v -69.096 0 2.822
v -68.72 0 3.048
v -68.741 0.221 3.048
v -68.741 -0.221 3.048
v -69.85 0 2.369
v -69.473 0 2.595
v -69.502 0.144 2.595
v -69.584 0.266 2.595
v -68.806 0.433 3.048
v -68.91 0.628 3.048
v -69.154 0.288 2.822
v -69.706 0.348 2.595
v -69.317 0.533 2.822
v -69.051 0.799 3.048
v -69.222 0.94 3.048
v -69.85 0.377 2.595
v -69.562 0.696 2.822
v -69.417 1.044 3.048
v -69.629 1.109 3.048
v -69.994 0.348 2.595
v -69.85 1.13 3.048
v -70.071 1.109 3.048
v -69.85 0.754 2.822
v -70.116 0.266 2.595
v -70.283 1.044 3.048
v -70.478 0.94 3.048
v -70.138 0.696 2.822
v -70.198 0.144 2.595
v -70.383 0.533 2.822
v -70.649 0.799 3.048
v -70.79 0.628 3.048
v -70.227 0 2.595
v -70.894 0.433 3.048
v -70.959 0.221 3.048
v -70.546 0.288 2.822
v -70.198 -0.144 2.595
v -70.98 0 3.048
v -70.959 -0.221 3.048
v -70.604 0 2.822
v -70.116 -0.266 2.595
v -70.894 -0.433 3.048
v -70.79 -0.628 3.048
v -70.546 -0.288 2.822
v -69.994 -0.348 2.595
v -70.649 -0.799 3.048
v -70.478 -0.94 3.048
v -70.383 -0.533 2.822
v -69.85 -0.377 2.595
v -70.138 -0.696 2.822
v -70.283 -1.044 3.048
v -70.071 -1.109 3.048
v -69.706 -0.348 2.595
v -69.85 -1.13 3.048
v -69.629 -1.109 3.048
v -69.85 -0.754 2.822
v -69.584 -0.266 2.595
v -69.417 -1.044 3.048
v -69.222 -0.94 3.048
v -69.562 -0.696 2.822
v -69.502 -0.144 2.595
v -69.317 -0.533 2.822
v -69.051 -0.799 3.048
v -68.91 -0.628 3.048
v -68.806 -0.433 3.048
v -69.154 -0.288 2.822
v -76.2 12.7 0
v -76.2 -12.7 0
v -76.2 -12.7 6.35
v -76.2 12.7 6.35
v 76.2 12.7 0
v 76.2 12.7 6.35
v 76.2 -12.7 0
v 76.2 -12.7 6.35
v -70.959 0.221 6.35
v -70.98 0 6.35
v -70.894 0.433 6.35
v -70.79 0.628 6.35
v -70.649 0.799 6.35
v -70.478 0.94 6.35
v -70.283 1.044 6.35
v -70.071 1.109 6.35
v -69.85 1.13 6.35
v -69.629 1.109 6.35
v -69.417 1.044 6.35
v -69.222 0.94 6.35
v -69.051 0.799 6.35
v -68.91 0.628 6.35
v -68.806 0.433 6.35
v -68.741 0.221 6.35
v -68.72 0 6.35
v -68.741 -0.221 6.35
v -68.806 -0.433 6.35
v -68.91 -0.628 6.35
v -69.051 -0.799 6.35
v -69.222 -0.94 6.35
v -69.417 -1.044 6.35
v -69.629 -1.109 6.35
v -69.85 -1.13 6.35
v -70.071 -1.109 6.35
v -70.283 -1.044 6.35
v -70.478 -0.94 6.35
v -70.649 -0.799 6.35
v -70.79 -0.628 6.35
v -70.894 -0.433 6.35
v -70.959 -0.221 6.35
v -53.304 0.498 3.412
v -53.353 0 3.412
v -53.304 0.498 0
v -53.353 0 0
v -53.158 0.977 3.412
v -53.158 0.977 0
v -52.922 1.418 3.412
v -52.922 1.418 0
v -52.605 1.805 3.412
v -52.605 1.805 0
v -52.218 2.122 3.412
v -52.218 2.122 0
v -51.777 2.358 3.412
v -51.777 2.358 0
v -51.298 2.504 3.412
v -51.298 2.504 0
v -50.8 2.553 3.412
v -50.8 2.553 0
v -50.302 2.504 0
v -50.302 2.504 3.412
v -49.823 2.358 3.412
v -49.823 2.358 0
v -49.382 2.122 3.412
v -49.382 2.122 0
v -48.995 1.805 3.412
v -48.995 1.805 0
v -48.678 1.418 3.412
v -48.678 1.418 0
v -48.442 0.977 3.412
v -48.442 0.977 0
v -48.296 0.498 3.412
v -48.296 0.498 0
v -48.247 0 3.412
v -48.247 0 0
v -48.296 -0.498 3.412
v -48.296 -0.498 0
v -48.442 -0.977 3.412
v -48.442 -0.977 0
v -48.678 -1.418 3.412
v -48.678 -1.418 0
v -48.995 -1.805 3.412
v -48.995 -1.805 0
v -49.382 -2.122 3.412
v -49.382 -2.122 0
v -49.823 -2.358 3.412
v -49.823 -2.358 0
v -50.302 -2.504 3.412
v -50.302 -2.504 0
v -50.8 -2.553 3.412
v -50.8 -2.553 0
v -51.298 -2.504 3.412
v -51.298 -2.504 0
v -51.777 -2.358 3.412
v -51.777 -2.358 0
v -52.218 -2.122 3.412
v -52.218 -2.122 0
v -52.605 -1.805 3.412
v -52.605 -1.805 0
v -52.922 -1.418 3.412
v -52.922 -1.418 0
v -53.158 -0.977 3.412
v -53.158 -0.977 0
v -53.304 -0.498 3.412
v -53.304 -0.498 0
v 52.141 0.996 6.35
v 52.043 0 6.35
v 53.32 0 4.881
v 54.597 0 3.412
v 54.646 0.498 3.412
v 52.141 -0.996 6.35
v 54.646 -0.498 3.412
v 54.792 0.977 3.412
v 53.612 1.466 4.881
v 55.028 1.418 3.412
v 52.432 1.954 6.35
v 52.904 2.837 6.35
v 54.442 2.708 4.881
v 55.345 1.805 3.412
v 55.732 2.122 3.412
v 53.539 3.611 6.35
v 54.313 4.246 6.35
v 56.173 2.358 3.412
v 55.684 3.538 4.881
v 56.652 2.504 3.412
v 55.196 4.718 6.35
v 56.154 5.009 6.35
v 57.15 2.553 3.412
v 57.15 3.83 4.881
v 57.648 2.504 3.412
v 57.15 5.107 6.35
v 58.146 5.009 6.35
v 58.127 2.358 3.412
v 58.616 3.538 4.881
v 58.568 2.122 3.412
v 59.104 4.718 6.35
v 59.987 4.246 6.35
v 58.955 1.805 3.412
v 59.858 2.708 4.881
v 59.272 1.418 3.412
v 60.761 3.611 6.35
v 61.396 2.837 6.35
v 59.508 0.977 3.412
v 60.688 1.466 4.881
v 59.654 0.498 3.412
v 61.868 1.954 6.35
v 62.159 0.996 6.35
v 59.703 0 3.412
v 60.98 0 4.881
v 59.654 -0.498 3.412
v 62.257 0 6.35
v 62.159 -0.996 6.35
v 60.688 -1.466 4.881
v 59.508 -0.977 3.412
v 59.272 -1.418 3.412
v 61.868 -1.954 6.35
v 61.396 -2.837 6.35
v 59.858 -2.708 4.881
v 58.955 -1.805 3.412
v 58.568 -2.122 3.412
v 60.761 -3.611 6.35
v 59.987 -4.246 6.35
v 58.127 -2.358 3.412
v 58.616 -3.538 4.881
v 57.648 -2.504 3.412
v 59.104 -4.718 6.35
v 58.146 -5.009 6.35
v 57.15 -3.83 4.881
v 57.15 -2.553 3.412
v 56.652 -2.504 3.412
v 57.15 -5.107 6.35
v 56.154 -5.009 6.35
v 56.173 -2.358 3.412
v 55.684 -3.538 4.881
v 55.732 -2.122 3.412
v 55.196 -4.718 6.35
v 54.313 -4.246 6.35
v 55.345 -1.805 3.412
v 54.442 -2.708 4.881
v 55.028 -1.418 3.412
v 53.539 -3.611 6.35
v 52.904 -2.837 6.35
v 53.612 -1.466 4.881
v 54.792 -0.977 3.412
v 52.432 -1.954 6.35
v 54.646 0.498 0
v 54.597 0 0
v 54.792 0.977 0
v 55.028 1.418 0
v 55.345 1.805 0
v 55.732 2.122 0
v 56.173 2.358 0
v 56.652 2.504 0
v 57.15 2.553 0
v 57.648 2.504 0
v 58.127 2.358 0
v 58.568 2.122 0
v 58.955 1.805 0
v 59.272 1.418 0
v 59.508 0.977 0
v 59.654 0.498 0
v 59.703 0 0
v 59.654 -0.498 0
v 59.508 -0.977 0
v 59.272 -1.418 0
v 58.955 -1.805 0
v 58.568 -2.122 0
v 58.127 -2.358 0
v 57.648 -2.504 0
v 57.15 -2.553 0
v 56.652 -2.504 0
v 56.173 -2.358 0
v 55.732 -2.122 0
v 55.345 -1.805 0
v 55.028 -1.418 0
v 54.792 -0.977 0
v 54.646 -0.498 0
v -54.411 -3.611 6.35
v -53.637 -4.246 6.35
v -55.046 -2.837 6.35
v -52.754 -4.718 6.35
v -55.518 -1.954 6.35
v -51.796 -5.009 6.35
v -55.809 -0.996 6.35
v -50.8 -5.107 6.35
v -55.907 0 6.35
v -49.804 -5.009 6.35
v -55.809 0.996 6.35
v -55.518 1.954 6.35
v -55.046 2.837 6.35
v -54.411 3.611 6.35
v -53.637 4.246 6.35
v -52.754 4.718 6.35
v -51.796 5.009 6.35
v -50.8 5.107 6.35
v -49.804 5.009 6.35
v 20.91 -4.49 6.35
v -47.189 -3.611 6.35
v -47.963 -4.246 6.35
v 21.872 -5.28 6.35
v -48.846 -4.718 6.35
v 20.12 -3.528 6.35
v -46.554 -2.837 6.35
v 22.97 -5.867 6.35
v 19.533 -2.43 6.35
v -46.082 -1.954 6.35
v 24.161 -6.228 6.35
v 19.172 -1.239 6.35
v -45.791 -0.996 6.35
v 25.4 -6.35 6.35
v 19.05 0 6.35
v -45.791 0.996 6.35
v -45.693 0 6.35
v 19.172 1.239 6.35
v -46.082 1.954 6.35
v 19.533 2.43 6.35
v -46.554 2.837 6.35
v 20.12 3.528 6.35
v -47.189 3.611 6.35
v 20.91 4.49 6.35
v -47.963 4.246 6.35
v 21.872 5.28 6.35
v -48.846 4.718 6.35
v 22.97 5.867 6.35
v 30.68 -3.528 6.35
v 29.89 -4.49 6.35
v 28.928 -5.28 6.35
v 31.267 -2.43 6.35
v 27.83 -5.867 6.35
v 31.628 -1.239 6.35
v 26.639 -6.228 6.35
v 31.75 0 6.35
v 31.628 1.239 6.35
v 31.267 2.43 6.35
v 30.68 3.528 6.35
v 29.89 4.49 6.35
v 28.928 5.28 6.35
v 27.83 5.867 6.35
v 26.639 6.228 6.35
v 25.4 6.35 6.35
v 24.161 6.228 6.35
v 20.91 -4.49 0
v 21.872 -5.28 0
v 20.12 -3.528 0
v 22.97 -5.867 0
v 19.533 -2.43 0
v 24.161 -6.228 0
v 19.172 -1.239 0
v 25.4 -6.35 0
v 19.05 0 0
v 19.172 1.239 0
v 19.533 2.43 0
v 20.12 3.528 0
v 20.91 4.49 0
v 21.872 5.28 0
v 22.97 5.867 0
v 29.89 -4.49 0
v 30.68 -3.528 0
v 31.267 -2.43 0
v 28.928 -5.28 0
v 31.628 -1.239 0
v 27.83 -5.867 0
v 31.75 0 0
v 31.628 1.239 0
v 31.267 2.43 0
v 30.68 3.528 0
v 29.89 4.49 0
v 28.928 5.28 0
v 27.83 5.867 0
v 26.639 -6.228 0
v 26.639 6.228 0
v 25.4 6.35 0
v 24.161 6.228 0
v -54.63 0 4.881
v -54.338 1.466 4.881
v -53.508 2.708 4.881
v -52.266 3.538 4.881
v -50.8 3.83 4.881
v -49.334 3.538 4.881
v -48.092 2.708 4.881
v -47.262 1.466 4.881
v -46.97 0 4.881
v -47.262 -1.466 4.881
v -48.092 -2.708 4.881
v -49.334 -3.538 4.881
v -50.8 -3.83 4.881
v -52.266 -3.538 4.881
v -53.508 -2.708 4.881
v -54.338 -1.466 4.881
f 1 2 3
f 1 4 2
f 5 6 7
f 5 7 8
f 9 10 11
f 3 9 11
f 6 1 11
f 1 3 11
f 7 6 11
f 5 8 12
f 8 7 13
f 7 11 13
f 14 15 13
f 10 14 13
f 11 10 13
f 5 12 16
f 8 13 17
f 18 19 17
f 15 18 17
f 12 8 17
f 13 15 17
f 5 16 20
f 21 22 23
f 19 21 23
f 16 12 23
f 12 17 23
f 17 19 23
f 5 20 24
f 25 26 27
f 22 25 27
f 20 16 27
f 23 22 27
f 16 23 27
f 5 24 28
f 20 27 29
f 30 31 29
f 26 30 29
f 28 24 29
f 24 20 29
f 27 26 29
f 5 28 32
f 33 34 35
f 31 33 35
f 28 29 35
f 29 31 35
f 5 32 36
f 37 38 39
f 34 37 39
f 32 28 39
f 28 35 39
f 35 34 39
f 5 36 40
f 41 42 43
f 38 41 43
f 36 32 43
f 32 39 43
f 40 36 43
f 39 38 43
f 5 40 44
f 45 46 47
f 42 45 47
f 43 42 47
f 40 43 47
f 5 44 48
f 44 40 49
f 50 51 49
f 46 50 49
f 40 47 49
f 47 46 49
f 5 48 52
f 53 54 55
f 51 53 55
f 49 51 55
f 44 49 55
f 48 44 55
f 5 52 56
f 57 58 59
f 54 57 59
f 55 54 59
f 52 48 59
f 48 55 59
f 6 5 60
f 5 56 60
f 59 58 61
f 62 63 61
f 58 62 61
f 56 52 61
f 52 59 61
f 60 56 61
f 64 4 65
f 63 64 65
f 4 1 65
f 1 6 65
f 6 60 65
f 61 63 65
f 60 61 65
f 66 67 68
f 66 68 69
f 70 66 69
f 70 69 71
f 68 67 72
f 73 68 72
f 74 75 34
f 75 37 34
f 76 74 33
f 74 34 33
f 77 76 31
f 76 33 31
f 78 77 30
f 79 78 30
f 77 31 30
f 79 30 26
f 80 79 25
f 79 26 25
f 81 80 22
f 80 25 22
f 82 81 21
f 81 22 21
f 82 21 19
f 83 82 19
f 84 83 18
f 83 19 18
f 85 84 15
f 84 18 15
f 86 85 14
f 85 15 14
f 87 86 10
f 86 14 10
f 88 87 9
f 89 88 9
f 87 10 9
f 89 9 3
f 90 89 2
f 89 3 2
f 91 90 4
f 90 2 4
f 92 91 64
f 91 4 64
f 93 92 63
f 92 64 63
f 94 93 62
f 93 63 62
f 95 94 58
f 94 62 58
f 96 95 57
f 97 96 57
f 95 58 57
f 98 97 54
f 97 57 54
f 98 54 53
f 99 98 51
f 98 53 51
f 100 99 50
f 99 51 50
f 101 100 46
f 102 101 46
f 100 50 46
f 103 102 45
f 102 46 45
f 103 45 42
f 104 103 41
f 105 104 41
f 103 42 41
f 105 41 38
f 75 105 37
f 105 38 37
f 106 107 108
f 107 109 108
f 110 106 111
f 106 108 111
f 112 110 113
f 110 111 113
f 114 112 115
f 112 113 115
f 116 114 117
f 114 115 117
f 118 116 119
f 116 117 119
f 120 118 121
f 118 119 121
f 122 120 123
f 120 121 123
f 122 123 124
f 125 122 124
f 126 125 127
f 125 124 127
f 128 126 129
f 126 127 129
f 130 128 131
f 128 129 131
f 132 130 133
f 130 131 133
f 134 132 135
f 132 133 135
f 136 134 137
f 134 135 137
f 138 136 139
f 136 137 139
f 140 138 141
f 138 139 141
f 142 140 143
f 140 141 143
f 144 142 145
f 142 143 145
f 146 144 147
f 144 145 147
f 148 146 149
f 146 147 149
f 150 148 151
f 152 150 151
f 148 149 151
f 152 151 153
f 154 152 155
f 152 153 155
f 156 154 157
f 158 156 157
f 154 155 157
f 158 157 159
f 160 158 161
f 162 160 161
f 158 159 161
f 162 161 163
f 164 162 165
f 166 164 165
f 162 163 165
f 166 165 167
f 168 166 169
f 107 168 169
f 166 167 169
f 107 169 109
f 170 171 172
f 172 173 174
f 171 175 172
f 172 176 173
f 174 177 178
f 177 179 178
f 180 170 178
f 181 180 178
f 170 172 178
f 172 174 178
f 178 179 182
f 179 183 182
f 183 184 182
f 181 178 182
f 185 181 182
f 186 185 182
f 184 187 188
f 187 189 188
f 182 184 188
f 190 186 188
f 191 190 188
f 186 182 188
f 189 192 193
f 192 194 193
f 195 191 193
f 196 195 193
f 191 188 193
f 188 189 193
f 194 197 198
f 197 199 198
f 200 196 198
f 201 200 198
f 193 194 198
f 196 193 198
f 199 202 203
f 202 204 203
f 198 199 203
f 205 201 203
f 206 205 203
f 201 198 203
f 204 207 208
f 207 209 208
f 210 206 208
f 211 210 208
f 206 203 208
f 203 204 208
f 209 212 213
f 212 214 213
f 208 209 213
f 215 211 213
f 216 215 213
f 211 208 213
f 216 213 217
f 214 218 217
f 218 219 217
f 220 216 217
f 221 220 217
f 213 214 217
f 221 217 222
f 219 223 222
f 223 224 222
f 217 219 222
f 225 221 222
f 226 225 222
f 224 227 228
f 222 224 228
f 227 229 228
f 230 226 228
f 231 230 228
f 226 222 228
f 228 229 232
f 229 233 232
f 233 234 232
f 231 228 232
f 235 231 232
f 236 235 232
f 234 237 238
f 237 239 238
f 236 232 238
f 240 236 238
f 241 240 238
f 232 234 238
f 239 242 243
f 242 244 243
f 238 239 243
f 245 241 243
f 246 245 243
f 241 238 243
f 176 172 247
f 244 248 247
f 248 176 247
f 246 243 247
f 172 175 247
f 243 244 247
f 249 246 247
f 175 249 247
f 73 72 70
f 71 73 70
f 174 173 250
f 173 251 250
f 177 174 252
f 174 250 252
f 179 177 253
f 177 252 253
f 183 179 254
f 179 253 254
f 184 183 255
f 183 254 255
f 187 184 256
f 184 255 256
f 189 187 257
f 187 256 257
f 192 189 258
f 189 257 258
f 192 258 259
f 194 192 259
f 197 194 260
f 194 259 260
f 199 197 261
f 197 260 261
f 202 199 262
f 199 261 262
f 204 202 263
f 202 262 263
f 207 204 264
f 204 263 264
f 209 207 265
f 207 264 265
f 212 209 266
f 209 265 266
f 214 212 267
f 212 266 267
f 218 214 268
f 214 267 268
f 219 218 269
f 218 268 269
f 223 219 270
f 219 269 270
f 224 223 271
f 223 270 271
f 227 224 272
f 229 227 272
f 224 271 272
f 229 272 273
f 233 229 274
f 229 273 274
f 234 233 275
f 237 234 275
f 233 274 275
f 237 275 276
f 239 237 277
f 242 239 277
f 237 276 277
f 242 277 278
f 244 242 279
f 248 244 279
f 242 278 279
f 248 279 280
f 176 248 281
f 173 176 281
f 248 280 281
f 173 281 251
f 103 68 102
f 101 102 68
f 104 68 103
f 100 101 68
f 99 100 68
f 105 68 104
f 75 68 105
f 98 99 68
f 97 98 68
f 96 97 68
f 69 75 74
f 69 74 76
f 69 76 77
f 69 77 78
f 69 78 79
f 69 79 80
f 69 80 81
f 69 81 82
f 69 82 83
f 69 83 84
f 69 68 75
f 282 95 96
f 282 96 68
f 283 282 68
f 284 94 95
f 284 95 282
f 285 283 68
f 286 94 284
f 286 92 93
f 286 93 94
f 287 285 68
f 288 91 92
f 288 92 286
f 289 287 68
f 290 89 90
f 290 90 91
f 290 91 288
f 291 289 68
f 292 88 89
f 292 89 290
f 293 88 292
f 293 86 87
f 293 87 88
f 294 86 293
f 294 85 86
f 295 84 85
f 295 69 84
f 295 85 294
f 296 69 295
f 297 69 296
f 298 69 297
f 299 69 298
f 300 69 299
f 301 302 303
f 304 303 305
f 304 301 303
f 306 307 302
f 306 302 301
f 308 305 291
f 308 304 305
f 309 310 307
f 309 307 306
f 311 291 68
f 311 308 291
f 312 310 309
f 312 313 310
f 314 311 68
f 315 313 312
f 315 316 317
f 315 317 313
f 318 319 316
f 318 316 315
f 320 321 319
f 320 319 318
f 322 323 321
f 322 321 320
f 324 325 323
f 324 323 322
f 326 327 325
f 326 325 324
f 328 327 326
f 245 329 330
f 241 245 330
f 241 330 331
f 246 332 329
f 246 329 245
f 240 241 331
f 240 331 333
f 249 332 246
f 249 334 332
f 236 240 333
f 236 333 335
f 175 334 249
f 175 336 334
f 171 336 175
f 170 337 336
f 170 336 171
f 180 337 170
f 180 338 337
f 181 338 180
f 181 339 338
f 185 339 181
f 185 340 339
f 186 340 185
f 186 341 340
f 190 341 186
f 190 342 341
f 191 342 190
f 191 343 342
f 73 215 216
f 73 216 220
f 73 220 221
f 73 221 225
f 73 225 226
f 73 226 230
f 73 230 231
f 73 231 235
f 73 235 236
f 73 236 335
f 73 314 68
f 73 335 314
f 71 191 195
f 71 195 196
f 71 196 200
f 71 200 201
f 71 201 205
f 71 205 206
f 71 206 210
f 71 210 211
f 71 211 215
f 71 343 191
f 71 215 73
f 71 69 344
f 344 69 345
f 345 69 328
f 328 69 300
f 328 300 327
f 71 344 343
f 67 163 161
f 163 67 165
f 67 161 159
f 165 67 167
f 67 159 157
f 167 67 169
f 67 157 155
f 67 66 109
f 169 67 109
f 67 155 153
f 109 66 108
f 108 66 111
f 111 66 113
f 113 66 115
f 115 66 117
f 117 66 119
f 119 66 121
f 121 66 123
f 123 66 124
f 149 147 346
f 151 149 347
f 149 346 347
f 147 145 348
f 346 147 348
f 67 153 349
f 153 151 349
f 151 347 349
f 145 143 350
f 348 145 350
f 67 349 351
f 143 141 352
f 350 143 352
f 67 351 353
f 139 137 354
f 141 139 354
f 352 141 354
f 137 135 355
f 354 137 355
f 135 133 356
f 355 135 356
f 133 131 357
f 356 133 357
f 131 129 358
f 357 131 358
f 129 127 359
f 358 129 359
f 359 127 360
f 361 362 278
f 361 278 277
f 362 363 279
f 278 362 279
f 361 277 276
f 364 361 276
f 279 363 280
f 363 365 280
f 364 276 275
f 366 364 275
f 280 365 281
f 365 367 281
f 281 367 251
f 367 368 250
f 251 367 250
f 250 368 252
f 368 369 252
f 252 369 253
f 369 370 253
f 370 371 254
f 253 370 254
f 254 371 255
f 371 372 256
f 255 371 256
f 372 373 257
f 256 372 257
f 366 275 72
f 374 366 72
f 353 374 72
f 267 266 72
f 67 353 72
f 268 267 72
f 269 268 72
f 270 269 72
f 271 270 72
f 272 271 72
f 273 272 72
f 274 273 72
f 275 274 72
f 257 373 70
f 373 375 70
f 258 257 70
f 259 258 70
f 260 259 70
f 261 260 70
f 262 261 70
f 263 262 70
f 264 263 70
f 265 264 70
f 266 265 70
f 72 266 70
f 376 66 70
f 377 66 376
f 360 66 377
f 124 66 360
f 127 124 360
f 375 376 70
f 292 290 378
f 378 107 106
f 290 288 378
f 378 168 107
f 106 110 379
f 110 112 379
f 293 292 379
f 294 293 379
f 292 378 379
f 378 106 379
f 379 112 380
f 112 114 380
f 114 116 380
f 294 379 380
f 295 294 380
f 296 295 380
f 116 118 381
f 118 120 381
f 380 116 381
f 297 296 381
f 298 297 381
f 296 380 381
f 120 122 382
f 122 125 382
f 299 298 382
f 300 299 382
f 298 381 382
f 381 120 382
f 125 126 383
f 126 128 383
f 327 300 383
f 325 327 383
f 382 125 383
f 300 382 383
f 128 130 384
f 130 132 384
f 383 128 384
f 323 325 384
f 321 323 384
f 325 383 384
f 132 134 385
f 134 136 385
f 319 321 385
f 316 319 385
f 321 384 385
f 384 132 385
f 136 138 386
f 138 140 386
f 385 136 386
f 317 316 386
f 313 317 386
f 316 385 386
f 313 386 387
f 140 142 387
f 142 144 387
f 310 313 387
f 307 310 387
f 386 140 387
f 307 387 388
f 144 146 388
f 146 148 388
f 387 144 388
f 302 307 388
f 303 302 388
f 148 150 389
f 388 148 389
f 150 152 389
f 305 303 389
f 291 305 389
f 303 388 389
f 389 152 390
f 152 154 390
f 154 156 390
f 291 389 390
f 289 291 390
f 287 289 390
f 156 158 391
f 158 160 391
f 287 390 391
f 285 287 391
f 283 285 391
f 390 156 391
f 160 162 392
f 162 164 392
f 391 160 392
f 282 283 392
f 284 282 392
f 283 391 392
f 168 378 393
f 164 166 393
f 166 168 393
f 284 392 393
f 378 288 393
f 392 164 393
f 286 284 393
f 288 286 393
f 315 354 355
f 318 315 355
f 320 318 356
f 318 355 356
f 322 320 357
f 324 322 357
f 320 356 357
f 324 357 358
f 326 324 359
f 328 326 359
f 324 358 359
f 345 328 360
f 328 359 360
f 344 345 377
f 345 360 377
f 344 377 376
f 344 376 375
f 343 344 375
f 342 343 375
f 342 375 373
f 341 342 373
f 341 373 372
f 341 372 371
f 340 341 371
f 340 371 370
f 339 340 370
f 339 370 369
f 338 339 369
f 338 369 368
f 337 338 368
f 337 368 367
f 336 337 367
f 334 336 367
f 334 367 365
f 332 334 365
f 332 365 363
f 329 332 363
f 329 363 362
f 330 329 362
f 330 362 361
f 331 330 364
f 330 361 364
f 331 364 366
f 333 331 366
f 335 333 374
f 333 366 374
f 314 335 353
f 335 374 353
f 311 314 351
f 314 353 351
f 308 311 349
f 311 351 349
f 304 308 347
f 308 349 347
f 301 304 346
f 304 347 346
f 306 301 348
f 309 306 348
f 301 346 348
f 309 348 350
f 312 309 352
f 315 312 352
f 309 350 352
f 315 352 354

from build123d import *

# Parameters (mm, degrees)
SKETCH1_W                                          = 152.4
SKETCH1_H                                          = 25.4
EXTRUDE1_DEPTH                                     = 6.35
F_4_40_TAPPED_HOLE2_D                              = 2.2606
F_4_40_TAPPED_HOLE2_DEPTH                          = 3.302
F_4_40_TAPPED_HOLE2_TIP                            = 0.679152758
F_1_2_0_5_DIAMETER_HOLE1_D                         = 12.7
CSK_FOR_10_FLAT_HEAD_SOCKET_CAP_SCREW2_D           = 5.1054
CSK_FOR_10_FLAT_HEAD_SOCKET_CAP_SCREW2_CSINK_D     = 10.21334
CSK_FOR_10_FLAT_HEAD_SOCKET_CAP_SCREW2_CSINK_ANGLE = 82
CSK_FOR_10_FLAT_HEAD_SOCKET_CAP_SCREW1_D           = 5.1054
CSK_FOR_10_FLAT_HEAD_SOCKET_CAP_SCREW1_CSINK_D     = 10.21334
CSK_FOR_10_FLAT_HEAD_SOCKET_CAP_SCREW1_CSINK_ANGLE = 82


with BuildPart() as part:
    # Sketch1 → Extrude1 (new body)
    with BuildSketch(Plane.XY):
        Rectangle(SKETCH1_W, SKETCH1_H)
    extrude(amount=EXTRUDE1_DEPTH)

    # #4-40 Tapped Hole2
    with Locations(Plane(origin=(-69.85, 0, 6.35), x_dir=(1, 0, 0), z_dir=(0, 0, 1))):
        with Locations((0, 0)):
            Hole(F_4_40_TAPPED_HOLE2_D / 2, depth=F_4_40_TAPPED_HOLE2_DEPTH)
            with Locations((0, 0, -(F_4_40_TAPPED_HOLE2_DEPTH + F_4_40_TAPPED_HOLE2_TIP / 2))):  # 118° drill point
                Cone(0, F_4_40_TAPPED_HOLE2_D / 2, F_4_40_TAPPED_HOLE2_TIP, mode=Mode.SUBTRACT)

    # 1/2 (0.5) Diameter Hole1 (through all)
    with Locations(Plane(origin=(25.4, 0, 6.35), x_dir=(1, 0, 0), z_dir=(0, 0, 1))):
        with Locations((0, 0)):
            Hole(F_1_2_0_5_DIAMETER_HOLE1_D / 2)

    # CSK for #10 Flat Head Socket Cap Screw2 (through all)
    with Locations(Plane(origin=(-2.296155795, -5.361260674, 6.35), x_dir=(1, 0, 0), z_dir=(0, 0, 1))):
        with Locations((59.446155795, 5.361260674)):
            CounterSinkHole(CSK_FOR_10_FLAT_HEAD_SOCKET_CAP_SCREW2_D / 2, CSK_FOR_10_FLAT_HEAD_SOCKET_CAP_SCREW2_CSINK_D / 2, counter_sink_angle=CSK_FOR_10_FLAT_HEAD_SOCKET_CAP_SCREW2_CSINK_ANGLE)

    # CSK for #10 Flat Head Socket Cap Screw1 (through all)
    with Locations(Plane(origin=(-2.296155795, -5.361260674, 6.35), x_dir=(1, 0, 0), z_dir=(0, 0, 1))):
        with Locations((-48.503844205, 5.361260674)):
            CounterSinkHole(CSK_FOR_10_FLAT_HEAD_SOCKET_CAP_SCREW1_D / 2, CSK_FOR_10_FLAT_HEAD_SOCKET_CAP_SCREW1_CSINK_D / 2, counter_sink_angle=CSK_FOR_10_FLAT_HEAD_SOCKET_CAP_SCREW1_CSINK_ANGLE)


solid = part.part
